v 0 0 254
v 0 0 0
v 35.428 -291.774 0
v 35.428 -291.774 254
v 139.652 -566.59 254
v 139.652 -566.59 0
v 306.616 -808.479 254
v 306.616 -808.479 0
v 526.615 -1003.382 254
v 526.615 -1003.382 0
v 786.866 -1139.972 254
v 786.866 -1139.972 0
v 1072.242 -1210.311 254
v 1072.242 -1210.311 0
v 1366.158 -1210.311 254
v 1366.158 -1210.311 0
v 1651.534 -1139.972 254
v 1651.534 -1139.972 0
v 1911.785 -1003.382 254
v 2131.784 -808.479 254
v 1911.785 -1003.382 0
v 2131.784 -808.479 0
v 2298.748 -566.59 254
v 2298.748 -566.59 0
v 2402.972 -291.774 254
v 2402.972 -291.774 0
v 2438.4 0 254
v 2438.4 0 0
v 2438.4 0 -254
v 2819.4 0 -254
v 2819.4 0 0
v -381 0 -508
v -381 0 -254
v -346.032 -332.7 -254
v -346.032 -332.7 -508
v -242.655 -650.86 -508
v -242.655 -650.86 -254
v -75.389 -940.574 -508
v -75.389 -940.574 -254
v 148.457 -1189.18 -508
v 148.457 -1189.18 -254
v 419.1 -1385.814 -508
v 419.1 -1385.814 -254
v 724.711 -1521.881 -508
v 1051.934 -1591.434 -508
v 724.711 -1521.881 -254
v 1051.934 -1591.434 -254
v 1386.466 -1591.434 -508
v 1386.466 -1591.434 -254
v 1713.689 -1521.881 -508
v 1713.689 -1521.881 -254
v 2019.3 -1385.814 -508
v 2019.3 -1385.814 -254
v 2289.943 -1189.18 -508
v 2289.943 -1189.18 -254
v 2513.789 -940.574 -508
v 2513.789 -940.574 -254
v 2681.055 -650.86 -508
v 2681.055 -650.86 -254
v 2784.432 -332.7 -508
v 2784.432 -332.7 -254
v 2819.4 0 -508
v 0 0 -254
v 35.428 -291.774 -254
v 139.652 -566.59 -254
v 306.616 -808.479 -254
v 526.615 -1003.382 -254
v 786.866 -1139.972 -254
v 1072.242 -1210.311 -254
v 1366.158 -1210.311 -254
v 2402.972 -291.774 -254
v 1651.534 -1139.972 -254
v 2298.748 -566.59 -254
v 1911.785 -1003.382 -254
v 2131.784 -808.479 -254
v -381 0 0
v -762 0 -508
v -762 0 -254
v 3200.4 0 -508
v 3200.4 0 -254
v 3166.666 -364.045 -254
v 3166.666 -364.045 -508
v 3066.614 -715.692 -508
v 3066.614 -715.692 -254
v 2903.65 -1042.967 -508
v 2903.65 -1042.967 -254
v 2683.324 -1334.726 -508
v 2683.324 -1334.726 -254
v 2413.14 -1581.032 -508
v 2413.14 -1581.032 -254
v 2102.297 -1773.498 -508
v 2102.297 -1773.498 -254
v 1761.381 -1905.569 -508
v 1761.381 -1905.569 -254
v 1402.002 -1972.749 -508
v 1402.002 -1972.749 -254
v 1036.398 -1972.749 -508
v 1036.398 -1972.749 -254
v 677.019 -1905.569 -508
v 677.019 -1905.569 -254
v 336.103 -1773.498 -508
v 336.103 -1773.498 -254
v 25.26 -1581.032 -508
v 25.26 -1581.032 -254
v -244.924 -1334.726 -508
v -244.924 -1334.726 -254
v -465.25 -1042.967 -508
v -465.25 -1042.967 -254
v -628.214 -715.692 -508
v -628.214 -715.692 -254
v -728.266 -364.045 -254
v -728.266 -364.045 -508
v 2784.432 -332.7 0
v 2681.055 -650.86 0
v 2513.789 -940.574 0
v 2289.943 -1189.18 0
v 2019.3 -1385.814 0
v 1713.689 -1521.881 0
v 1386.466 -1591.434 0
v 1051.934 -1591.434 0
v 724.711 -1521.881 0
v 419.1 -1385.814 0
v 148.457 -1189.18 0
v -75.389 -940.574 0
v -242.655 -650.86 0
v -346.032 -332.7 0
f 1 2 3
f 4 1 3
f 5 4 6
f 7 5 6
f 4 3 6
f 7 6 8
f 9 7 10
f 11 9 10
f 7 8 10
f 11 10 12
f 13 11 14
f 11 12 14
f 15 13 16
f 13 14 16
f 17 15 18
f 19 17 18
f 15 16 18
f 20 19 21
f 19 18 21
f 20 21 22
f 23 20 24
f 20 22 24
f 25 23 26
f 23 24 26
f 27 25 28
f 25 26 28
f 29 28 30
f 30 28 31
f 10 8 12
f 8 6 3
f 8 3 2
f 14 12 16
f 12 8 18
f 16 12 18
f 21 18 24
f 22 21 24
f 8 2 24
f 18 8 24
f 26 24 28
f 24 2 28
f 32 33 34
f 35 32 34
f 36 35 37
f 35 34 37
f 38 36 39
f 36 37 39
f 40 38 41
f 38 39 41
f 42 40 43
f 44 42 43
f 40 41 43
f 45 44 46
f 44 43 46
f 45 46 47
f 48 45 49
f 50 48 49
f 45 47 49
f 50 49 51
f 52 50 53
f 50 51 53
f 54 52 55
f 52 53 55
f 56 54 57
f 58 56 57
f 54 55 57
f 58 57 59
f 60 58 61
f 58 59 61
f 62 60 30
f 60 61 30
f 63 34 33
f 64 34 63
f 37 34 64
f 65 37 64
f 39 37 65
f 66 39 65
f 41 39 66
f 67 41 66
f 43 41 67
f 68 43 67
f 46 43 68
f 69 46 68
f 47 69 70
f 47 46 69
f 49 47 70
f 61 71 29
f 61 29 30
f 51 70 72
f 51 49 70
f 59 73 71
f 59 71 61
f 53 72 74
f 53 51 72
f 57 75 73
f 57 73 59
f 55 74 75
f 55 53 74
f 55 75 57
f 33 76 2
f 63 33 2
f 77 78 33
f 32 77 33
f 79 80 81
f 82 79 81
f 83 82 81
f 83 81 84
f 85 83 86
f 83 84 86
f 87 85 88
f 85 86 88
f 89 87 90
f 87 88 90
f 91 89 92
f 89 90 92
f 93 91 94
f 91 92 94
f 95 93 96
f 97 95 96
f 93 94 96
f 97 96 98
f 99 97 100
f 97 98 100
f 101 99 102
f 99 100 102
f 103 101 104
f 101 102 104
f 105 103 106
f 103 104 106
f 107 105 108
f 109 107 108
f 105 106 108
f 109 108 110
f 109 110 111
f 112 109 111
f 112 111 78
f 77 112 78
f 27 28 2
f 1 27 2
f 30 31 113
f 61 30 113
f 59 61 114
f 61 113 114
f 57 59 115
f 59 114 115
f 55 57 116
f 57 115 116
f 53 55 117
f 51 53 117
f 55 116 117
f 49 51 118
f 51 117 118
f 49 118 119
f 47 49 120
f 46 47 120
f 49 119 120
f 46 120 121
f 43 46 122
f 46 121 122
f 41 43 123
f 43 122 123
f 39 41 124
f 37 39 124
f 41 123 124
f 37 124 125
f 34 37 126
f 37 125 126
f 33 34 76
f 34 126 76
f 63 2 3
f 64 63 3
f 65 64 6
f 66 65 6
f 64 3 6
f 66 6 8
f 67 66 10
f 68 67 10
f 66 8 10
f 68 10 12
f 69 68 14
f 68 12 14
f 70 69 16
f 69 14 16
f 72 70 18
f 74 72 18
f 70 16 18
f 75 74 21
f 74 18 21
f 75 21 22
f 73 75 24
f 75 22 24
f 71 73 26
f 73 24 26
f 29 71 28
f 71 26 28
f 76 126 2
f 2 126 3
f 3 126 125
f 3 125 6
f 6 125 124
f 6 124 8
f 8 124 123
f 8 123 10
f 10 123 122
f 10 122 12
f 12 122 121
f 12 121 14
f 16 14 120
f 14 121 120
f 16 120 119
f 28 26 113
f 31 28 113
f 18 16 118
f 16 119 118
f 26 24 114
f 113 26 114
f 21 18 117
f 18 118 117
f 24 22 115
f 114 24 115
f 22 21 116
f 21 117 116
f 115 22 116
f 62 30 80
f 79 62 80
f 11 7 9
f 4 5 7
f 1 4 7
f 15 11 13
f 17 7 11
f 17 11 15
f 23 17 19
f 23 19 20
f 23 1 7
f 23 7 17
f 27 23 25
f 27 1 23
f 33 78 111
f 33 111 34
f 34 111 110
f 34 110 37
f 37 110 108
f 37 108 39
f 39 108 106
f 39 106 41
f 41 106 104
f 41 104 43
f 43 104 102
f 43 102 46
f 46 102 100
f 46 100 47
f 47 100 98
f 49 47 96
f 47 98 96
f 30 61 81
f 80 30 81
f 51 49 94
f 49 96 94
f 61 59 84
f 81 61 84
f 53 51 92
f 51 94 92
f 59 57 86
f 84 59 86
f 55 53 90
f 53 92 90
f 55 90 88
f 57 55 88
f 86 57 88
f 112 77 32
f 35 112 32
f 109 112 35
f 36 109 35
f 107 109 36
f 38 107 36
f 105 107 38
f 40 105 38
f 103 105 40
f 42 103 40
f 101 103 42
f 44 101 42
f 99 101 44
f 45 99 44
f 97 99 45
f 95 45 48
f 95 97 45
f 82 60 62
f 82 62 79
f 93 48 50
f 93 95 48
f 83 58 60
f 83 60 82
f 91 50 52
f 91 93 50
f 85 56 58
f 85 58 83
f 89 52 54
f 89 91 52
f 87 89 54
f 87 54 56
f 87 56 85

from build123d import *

# Parameters (mm, degrees)
F1_DEPTH = 254
F3_DEPTH = 254
F5_DEPTH = 254


with BuildPart() as f1:
    # F0 (on Top) → F1 (new body)
    with BuildSketch(Plane.XY):
        with BuildLine():
            Line((2438.4, 0), (0, 0))
            ThreePointArc((0, 0), (1219.2, -1219.2), (2438.4, 0))
        make_face()
    extrude(amount=F1_DEPTH)


with BuildPart() as f3:
    # F2 (on face) → F3 (new body)
    with BuildSketch(Plane(origin=(0, 0, 0), x_dir=(1, 0, 0), z_dir=(0, 0, -1))):
        with BuildLine():
            Line((-381, 0), (0, 0))
            ThreePointArc((0, 0), (1219.2, 1219.2), (2438.4, 0))
            Line((2438.4, 0), (2819.4, 0))
            ThreePointArc((2819.4, 0), (1219.2, 1600.2), (-381, 0))
        make_face()
    extrude(amount=F3_DEPTH)


with BuildPart() as f5:
    # F4 (on face) → F5 (new body)
    with BuildSketch(Plane(origin=(0, 0, -254), x_dir=(1, 0, 0), z_dir=(0, 0, -1))):
        with BuildLine():
            Line((-762, 0), (-381, 0))
            ThreePointArc((-381, 0), (1219.2, 1600.2), (2819.4, 0))
            Line((2819.4, 0), (3200.4, 0))
            ThreePointArc((3200.4, 0), (1219.2, 1981.2), (-762, 0))
        make_face()
    extrude(amount=F5_DEPTH)


solid = Compound([f1.part, f3.part, f5.part])
